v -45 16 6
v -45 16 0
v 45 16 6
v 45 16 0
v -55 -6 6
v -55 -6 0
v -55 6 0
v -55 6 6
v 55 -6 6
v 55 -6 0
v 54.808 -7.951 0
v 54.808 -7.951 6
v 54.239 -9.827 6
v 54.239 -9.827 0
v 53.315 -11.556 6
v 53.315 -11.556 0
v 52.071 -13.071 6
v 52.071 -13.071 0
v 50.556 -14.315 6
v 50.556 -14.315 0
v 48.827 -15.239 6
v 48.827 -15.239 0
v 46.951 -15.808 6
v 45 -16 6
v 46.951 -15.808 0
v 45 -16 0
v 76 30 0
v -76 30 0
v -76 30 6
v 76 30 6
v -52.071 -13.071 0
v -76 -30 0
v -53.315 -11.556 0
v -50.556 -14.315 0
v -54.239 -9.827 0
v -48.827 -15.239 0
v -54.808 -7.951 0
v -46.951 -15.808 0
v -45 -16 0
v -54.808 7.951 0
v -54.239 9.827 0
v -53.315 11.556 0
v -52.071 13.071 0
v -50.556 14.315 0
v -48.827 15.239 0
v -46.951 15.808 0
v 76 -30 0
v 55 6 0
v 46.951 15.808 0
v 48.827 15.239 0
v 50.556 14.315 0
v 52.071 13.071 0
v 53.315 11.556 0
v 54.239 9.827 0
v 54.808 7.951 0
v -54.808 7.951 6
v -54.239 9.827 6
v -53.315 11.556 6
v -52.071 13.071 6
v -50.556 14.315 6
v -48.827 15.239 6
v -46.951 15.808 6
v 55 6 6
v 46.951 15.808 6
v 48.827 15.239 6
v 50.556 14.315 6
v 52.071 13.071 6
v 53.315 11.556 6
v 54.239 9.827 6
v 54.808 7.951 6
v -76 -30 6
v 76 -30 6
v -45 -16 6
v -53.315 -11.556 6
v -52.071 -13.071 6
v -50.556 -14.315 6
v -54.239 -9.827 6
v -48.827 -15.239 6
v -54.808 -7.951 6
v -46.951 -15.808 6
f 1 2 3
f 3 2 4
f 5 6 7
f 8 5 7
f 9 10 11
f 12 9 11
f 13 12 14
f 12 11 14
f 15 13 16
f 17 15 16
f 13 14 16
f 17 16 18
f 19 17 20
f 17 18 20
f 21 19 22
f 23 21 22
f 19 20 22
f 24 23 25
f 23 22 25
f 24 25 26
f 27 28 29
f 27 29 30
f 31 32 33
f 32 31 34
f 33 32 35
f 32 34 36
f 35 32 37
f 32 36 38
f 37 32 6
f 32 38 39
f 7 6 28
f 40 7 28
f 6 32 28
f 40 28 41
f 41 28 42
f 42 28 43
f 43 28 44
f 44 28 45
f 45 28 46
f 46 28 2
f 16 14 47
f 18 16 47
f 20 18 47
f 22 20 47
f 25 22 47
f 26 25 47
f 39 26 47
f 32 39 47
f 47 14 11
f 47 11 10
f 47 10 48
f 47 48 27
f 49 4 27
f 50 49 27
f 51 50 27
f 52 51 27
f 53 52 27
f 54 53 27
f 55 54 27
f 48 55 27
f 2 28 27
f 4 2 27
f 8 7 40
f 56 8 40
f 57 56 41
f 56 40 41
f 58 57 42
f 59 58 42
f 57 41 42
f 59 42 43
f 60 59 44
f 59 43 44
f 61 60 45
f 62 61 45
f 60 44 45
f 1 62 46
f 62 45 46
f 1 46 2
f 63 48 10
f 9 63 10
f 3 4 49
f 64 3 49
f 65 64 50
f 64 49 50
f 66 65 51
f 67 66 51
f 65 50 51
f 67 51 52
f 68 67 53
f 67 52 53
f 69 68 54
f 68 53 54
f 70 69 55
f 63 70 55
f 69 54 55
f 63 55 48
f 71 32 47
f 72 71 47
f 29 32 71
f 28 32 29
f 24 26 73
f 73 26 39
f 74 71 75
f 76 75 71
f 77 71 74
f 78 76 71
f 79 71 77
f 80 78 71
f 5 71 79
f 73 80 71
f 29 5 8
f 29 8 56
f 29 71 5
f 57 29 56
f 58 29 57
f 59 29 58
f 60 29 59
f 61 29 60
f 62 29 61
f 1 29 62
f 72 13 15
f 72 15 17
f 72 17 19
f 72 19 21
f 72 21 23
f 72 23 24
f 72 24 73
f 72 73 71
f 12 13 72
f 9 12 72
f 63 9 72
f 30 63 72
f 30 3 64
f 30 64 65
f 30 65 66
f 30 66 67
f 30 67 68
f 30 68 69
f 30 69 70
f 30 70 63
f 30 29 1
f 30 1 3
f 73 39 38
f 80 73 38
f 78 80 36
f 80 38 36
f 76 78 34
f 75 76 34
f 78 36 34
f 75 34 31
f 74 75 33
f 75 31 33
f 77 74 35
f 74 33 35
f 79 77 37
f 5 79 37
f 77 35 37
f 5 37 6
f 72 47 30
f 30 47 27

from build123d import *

# Parameters (mm, degrees)
ESBO_O1_W                = 152
ESBO_O1_H                = 60
RESSALTO_EXTRUS_O2_DEPTH = 6


with BuildPart() as part:
    # Esboço1 → Ressalto-extrusão2 (new body)
    with BuildSketch(Plane.XY):
        Rectangle(ESBO_O1_W, ESBO_O1_H)
        with BuildLine():
            Line((45, -16), (-45, -16))
            ThreePointArc((-45, -16), (-52.071067812, -13.071067812), (-55, -6))
            Line((-55, -6), (-55, 6))
            ThreePointArc((-55, 6), (-52.071067812, 13.071067812), (-45, 16))
            Line((-45, 16), (45, 16))
            ThreePointArc((45, 16), (52.071067812, 13.071067812), (55, 6))
            Line((55, 6), (55, -6))
            ThreePointArc((55, -6), (52.071067812, -13.071067812), (45, -16))
        make_face(mode=Mode.SUBTRACT)
    extrude(amount=RESSALTO_EXTRUS_O2_DEPTH)


solid = part.part
